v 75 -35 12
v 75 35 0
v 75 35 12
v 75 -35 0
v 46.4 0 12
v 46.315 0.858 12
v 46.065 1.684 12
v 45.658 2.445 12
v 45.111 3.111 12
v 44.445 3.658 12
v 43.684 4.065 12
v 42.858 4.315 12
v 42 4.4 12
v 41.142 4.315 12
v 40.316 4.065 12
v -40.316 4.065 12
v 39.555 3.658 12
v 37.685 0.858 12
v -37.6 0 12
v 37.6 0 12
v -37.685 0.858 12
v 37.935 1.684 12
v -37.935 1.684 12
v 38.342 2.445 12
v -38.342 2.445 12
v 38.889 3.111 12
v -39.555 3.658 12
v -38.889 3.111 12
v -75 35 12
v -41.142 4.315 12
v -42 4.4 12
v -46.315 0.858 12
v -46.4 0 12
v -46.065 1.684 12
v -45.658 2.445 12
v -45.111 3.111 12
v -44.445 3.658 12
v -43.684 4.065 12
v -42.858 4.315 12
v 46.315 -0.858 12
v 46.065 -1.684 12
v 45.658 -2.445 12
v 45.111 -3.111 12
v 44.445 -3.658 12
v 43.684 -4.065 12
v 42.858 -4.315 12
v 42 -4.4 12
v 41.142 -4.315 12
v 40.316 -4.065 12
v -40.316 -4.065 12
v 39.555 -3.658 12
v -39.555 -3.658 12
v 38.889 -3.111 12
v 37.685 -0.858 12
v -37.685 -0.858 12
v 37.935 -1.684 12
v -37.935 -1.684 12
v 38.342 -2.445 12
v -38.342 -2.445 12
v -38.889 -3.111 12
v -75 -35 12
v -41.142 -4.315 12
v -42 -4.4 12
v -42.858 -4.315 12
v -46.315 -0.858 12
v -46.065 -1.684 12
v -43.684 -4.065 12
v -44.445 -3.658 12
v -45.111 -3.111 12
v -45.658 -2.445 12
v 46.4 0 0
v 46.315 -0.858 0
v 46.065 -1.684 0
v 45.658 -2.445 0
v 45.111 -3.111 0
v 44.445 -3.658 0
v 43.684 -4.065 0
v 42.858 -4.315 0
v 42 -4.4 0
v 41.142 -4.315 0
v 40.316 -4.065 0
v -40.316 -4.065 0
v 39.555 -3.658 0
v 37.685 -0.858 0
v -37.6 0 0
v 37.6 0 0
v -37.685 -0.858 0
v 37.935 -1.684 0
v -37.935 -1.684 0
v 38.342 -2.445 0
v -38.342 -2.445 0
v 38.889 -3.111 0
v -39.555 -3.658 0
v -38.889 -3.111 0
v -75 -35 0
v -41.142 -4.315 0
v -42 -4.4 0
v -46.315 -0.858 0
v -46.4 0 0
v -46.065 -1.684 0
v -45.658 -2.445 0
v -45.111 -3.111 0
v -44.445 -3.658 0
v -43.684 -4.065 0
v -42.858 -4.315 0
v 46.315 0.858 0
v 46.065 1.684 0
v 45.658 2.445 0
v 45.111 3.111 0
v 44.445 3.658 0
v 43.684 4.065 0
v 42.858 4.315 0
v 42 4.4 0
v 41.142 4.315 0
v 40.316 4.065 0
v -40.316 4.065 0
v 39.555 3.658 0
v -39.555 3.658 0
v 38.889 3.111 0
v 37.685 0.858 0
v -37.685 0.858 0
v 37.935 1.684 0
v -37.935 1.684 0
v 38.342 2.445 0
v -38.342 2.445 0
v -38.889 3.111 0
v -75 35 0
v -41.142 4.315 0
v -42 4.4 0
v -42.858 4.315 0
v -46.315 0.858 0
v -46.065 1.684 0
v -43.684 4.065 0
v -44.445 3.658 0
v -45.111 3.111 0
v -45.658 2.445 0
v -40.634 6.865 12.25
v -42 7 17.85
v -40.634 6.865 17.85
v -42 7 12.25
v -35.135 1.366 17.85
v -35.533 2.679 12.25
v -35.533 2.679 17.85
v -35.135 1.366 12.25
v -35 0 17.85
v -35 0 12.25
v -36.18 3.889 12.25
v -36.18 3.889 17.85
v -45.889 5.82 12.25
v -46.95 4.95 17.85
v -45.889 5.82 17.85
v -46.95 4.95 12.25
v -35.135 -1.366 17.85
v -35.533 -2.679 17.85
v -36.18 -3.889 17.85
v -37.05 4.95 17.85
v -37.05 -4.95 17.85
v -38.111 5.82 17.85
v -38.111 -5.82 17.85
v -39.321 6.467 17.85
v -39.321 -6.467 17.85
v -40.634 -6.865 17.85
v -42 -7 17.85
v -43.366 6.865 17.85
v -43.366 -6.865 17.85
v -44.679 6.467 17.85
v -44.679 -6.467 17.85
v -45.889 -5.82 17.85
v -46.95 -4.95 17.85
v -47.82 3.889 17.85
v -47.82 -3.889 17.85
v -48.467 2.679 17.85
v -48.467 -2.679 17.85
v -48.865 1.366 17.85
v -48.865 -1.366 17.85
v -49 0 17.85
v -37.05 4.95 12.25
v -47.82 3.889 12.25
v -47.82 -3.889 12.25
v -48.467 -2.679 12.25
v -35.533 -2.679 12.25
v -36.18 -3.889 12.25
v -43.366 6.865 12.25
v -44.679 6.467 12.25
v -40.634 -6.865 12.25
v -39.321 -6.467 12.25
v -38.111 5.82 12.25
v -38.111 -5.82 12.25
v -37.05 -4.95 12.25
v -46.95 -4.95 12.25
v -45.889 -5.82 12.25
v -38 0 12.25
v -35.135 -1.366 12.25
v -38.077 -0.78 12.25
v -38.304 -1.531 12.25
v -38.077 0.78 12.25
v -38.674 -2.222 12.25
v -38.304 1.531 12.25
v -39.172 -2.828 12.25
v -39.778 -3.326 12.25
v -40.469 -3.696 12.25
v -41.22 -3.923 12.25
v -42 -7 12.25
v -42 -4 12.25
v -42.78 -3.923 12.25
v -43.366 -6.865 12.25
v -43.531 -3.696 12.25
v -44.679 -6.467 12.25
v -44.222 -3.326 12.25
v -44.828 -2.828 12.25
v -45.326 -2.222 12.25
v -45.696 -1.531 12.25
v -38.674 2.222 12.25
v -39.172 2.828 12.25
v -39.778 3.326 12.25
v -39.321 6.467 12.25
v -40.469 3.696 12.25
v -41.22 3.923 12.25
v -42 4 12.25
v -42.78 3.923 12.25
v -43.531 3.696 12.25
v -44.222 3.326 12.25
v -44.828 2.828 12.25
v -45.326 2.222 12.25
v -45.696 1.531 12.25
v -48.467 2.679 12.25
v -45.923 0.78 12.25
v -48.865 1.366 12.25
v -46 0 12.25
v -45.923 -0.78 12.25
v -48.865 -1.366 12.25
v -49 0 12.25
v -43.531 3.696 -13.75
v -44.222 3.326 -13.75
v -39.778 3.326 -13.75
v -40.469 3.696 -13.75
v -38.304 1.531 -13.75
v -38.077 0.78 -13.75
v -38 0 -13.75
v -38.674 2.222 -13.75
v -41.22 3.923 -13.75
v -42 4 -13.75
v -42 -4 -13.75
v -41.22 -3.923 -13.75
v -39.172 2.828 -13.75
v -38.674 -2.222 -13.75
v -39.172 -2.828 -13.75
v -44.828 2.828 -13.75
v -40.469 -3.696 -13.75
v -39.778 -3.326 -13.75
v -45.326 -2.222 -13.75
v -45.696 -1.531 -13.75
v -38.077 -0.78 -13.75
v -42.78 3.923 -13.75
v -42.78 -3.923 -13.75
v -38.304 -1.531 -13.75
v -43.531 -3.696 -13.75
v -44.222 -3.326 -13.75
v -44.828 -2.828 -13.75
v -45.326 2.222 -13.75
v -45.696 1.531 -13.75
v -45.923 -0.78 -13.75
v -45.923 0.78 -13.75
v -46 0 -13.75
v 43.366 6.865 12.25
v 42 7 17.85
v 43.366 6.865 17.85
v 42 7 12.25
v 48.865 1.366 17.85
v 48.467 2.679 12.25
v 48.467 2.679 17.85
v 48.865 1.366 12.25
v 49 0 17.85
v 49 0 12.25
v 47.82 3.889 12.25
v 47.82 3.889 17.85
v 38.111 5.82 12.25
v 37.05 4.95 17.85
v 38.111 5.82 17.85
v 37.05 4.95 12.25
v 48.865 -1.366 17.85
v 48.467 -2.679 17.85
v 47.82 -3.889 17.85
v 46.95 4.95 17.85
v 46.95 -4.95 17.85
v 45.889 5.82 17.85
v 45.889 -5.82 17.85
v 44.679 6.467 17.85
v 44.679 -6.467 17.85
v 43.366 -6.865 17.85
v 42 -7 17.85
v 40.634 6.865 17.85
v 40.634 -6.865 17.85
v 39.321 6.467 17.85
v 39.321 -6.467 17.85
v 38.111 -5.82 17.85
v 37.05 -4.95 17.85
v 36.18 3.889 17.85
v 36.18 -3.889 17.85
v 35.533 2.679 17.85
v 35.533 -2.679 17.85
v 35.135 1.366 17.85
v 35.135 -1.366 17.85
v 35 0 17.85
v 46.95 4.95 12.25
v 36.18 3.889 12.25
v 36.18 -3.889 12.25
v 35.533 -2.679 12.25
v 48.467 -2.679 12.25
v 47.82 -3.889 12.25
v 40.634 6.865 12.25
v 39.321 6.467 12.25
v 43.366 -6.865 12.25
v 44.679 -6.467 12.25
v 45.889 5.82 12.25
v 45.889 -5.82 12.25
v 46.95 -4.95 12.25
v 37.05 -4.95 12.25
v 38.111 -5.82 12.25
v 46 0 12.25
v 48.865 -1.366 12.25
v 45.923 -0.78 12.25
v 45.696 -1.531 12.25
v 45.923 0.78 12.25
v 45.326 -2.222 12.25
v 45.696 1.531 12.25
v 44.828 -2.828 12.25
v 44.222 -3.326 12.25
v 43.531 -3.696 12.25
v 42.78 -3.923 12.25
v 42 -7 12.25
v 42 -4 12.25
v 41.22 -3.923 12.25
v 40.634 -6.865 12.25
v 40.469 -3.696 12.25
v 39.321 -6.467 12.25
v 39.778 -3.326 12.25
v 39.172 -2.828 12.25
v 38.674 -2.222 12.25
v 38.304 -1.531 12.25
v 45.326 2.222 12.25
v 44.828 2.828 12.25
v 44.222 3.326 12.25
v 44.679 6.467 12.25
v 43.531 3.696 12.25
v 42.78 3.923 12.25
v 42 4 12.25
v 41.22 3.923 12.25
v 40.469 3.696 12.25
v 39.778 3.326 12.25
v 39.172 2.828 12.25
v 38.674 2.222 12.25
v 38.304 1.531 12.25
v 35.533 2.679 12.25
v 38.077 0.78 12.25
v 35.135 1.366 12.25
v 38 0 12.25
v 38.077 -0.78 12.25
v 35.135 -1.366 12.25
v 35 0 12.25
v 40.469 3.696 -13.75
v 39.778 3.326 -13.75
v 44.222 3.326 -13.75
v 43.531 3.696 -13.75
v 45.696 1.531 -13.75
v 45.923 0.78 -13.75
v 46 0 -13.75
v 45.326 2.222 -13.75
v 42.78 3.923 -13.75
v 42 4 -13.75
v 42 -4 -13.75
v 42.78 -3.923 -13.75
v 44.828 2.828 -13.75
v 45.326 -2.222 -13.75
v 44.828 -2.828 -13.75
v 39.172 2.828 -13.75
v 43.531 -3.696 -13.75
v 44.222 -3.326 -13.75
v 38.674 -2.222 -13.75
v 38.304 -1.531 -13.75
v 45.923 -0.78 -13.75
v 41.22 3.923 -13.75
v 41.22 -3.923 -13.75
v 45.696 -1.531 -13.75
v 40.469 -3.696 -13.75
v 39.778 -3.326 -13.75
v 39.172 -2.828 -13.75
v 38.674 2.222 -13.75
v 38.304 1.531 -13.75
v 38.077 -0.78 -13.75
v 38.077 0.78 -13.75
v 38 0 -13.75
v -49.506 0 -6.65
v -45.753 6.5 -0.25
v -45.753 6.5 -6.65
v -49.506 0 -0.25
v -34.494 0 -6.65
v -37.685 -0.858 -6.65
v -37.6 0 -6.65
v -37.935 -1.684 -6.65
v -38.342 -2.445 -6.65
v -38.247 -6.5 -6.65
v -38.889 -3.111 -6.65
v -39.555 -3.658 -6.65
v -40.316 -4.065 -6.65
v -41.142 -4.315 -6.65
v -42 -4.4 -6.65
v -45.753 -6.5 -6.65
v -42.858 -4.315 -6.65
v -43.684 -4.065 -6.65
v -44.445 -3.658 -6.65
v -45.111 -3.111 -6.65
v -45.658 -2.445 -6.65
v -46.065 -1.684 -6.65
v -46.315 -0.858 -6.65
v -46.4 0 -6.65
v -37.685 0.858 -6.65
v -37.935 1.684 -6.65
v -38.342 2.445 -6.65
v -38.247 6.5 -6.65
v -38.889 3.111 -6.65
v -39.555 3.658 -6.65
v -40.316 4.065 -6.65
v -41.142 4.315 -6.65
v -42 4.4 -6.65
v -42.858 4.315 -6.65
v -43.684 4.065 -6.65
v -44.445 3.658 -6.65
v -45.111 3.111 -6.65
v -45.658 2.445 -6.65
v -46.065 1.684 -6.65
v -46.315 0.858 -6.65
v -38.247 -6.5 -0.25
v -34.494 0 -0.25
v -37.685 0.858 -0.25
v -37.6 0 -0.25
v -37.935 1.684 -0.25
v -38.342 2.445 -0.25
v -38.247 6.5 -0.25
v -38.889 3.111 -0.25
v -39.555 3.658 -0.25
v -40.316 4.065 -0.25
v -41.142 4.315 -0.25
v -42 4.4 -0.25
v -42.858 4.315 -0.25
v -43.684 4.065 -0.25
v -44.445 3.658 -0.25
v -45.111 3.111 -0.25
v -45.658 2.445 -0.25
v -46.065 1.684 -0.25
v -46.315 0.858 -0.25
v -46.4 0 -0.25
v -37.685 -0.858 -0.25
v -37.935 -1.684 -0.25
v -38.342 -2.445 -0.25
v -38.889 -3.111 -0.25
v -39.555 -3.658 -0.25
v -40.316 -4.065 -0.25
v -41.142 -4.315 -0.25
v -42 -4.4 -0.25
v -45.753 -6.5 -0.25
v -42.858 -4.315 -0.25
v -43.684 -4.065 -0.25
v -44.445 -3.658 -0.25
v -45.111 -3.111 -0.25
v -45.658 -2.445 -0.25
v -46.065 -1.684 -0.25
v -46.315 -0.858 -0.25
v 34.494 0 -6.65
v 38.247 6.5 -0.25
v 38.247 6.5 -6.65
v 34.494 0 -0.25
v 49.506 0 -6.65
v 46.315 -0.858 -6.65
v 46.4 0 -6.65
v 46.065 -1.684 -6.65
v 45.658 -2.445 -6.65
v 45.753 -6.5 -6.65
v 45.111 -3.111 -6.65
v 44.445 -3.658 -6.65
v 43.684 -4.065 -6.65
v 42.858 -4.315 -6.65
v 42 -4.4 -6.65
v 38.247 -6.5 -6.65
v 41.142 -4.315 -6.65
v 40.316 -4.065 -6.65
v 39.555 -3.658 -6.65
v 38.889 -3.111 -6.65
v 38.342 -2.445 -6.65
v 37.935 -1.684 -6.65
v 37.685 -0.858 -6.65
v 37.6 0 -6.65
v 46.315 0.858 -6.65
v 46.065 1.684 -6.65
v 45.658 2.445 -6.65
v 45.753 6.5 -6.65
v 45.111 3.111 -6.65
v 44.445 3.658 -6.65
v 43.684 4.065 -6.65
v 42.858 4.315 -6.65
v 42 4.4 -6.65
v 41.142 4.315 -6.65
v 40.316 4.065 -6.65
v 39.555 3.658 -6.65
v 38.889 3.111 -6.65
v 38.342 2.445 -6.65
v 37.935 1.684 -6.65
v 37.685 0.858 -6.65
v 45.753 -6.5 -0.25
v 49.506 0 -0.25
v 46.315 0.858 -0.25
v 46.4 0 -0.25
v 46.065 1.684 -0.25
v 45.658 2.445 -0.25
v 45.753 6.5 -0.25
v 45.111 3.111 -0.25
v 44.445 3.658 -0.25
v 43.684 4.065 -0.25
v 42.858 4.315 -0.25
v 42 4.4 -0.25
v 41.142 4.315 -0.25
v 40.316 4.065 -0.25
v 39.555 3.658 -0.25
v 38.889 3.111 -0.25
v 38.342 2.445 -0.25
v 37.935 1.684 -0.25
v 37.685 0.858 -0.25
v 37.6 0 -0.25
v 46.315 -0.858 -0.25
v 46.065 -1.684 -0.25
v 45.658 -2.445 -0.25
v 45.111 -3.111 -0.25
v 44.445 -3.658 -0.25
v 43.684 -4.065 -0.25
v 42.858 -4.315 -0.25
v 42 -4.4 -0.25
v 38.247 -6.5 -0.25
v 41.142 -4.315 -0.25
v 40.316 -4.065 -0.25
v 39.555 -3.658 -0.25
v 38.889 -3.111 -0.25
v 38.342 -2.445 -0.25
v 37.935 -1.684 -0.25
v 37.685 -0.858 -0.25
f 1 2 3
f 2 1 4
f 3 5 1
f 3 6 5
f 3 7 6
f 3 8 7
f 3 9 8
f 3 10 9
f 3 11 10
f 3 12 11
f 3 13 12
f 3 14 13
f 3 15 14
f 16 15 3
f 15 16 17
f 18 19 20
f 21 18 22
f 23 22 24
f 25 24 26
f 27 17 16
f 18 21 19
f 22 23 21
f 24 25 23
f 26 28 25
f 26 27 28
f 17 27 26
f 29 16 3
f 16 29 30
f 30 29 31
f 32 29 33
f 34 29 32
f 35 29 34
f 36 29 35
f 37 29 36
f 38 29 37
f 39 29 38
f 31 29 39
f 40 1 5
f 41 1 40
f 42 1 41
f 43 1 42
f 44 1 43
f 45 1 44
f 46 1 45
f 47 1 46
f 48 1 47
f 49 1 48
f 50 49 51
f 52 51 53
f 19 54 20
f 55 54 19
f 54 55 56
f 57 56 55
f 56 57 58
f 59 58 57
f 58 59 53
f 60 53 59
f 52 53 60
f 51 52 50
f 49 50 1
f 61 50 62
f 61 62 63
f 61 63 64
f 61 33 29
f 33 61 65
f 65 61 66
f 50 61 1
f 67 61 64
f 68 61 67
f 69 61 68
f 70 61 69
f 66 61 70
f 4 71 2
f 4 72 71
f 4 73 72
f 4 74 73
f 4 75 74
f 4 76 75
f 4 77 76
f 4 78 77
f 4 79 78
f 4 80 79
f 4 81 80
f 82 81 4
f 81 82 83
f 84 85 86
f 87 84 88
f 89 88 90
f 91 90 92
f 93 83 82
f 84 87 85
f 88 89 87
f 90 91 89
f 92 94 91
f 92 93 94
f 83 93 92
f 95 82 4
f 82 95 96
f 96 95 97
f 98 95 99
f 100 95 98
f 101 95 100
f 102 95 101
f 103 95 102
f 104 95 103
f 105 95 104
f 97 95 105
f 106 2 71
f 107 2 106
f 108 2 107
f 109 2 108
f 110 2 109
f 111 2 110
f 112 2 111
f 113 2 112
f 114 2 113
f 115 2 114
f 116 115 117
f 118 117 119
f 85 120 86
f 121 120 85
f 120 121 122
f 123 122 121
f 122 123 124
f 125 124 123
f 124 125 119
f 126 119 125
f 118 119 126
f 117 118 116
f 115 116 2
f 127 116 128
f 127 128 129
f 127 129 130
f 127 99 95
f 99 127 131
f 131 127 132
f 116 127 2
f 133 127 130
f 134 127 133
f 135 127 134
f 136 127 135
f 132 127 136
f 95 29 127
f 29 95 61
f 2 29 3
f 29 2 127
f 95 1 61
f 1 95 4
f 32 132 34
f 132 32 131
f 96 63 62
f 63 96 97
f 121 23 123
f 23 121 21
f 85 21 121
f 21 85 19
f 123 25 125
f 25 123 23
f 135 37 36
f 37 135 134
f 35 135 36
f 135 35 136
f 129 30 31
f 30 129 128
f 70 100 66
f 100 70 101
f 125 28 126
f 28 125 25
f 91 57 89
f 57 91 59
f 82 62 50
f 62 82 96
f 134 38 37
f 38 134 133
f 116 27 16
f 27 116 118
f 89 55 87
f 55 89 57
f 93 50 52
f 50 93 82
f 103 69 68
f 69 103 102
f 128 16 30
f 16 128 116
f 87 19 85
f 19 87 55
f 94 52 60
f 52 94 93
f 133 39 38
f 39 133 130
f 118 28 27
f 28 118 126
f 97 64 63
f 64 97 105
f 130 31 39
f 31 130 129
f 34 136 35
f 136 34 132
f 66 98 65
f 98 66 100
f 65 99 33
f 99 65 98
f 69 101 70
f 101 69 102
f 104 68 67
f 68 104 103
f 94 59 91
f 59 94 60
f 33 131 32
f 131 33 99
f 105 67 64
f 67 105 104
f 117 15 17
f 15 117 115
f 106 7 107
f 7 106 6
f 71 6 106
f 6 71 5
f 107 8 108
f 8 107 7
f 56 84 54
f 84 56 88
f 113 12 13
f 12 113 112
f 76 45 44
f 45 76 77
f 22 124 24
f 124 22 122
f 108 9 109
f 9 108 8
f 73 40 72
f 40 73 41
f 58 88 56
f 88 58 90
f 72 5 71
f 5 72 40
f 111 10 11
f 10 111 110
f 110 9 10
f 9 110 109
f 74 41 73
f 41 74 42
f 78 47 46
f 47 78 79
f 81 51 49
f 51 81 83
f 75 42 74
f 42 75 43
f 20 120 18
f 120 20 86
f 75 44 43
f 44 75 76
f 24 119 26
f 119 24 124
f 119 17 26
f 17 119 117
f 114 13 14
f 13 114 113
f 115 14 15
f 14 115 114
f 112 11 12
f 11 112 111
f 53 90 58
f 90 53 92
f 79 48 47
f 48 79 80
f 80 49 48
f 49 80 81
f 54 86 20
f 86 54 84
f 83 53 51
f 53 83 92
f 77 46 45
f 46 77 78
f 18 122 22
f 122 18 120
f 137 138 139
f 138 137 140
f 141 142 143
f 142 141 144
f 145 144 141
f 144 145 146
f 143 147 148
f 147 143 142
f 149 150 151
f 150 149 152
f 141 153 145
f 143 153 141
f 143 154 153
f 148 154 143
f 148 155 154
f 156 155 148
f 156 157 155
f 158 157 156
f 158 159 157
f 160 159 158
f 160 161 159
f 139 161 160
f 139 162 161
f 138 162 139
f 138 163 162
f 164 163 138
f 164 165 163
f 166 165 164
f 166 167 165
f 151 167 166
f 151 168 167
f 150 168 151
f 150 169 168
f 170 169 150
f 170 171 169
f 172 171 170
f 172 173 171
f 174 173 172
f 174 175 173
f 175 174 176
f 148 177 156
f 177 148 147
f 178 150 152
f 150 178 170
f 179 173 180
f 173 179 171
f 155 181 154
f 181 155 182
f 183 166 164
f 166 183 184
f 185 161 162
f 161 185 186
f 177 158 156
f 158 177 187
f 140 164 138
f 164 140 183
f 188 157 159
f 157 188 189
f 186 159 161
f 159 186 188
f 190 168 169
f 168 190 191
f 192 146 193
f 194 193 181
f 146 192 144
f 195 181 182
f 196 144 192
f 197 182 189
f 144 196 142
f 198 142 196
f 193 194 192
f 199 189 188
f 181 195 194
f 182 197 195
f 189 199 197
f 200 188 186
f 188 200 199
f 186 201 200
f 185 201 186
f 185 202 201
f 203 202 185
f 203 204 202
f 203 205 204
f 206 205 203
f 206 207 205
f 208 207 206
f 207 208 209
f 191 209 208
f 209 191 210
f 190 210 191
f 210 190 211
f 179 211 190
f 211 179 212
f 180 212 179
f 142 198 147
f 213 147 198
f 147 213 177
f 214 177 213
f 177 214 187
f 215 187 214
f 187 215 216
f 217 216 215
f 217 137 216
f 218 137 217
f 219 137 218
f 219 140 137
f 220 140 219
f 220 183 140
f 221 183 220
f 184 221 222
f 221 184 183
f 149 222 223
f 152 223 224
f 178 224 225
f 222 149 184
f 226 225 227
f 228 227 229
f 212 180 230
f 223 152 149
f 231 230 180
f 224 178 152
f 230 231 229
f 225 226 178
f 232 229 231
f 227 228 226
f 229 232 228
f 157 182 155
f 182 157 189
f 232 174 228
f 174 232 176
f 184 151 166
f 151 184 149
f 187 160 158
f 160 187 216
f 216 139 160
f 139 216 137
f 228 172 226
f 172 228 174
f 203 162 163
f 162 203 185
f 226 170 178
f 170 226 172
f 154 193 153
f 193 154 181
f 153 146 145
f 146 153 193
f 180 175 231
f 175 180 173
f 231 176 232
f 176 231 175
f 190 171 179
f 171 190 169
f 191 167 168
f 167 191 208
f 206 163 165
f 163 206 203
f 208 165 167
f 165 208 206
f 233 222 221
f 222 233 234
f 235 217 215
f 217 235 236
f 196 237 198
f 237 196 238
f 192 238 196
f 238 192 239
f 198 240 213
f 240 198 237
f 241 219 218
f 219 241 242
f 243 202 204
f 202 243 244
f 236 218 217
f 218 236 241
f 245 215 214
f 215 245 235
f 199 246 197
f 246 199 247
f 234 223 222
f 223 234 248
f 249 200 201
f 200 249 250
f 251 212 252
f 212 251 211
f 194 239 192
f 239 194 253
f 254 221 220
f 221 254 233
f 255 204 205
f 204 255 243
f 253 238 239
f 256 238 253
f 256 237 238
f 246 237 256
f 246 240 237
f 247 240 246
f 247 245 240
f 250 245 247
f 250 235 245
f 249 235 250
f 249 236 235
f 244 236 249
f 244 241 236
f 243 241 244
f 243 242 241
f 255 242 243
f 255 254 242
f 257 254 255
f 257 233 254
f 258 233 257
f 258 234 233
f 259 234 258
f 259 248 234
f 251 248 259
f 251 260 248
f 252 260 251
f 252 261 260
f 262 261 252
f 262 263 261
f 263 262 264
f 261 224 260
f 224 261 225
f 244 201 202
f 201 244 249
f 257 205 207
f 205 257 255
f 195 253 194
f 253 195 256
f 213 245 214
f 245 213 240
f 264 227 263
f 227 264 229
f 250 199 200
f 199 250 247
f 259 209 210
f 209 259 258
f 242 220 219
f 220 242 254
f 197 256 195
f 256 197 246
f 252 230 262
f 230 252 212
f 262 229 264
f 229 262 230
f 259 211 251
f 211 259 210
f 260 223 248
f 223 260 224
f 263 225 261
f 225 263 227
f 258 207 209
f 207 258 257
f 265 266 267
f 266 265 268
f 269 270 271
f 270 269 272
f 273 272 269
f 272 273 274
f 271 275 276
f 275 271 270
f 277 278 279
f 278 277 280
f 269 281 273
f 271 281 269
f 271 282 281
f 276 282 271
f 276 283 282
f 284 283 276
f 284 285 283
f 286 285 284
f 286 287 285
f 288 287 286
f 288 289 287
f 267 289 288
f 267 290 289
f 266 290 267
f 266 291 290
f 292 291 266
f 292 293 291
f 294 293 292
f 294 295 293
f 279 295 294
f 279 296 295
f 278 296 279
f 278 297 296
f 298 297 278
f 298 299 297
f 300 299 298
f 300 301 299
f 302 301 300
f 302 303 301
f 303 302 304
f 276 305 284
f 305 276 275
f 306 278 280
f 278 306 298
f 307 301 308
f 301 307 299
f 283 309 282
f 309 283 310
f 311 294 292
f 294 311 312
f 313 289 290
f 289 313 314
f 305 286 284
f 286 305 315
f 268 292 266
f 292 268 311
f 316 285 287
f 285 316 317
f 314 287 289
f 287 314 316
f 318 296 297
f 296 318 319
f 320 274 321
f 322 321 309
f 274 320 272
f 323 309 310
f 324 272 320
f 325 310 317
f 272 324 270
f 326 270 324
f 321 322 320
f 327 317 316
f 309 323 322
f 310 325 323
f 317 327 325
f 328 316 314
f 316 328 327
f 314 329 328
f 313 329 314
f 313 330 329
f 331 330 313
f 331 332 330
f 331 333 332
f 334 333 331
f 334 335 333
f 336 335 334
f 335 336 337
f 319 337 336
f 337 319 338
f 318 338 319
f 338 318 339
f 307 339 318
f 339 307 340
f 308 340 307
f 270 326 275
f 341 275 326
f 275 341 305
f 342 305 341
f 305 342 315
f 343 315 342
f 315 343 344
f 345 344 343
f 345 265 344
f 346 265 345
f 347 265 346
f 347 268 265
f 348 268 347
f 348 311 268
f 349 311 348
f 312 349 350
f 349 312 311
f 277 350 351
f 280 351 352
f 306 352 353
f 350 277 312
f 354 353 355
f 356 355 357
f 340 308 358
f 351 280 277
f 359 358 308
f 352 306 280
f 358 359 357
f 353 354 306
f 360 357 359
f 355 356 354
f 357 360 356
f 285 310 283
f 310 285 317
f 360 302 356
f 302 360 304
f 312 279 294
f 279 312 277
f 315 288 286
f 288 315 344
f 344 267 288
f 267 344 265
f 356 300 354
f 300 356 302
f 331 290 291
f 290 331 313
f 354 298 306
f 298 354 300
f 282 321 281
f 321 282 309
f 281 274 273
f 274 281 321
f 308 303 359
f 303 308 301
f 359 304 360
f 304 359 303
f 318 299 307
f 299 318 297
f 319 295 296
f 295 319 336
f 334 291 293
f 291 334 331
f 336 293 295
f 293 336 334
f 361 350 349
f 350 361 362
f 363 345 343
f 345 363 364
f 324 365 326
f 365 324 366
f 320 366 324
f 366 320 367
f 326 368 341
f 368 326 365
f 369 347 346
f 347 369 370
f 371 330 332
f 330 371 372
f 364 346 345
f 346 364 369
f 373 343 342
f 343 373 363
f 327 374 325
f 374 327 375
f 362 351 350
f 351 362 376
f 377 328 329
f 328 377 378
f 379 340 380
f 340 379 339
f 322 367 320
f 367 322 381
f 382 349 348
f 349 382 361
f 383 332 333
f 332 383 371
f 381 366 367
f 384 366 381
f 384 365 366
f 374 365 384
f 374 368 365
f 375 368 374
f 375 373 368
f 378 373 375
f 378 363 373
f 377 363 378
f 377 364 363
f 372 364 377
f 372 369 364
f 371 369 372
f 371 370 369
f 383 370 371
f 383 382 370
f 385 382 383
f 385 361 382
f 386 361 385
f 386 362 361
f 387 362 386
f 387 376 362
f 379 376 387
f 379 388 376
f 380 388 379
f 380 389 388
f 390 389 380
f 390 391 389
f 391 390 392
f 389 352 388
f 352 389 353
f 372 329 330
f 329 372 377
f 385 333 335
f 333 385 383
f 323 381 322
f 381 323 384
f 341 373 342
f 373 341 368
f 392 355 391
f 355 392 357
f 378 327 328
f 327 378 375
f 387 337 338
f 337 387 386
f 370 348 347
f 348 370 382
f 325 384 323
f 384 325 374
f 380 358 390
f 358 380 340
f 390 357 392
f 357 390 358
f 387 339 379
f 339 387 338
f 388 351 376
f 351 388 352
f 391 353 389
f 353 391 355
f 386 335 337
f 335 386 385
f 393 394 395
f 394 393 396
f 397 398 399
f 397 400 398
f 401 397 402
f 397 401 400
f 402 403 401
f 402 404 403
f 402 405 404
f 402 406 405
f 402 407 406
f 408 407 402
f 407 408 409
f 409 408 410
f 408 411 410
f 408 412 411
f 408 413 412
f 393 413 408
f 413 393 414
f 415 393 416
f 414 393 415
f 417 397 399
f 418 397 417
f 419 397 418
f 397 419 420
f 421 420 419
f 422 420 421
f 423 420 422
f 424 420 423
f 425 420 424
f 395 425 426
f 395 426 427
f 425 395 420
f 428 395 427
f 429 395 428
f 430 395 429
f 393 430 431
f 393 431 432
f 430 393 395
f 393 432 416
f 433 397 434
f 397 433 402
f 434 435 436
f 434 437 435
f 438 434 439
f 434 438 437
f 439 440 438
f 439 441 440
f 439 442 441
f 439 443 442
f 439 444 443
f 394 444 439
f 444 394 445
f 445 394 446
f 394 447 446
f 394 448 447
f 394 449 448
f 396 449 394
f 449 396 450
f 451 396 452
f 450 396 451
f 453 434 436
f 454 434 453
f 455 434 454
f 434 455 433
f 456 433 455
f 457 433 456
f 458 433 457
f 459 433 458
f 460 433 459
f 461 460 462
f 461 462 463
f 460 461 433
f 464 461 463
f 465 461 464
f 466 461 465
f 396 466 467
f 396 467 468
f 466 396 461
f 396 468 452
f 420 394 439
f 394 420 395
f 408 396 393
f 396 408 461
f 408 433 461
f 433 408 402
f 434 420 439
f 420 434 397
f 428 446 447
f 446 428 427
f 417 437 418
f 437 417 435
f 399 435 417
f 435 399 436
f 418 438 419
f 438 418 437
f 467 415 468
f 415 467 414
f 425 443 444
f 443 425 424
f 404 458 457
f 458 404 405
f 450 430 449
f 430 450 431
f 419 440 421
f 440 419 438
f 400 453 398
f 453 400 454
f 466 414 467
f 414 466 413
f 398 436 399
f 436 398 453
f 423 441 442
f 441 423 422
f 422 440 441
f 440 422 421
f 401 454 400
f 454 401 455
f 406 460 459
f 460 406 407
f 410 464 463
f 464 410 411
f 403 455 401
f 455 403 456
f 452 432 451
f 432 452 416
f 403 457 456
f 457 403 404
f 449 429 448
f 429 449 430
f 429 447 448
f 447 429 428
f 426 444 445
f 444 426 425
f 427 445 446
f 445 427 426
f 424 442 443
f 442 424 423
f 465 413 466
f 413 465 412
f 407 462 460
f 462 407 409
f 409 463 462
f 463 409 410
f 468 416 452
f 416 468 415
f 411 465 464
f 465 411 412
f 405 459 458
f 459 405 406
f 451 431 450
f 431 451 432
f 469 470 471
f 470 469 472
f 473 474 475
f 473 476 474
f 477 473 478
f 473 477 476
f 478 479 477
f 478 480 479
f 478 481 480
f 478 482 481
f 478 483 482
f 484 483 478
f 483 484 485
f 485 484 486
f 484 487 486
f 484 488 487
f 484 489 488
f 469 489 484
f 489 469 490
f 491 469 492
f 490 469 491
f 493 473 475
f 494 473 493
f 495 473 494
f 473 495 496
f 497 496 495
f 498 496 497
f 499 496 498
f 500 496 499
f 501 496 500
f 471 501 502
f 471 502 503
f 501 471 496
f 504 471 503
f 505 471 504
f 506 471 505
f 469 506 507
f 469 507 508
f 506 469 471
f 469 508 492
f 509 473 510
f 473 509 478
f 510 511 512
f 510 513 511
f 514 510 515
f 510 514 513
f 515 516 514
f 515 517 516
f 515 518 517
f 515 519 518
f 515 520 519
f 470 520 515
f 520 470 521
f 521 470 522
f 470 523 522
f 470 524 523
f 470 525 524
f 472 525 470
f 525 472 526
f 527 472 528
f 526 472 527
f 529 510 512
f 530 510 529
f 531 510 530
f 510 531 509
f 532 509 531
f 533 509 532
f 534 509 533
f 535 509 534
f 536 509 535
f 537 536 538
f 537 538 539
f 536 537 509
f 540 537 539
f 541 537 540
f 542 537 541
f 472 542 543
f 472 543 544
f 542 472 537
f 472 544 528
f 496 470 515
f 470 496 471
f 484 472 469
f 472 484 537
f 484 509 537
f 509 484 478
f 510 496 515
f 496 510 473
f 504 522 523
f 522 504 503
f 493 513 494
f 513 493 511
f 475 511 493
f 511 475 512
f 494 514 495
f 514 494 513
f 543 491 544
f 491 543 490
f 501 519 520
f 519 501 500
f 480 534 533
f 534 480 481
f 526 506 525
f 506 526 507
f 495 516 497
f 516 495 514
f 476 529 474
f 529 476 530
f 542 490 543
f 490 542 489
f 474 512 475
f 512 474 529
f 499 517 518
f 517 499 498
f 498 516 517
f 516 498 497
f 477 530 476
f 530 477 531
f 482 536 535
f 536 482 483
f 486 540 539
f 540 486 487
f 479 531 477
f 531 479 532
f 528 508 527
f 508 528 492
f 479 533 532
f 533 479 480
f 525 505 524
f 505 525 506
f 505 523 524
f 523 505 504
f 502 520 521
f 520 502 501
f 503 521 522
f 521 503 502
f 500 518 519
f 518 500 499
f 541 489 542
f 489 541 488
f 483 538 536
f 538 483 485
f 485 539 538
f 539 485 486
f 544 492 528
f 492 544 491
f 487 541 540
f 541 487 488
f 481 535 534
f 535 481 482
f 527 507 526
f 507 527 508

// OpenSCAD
$fn = 32;

// ------------------------------------------------------------------------
// Bolted plate: 150 x 70 x 12 mm plate, 2 fasteners
// Every part is its own module, assembly() places them once.
// ------------------------------------------------------------------------

// --- part 1 ---
module plate() {
  difference() {
    translate([-75, -35, 0]) cube([150, 70, 12]);
    translate([-42, 0, -1]) cylinder(h = 14, d = 8.8);
    translate([42, 0, -1]) cylinder(h = 14, d = 8.8);
  }
}

// --- part 2 ---
module bolt1() {
  cylinder(h = 5.6, d = 14);
  translate([0, 0, -26]) cylinder(h = 26, d = 8);
}

// --- part 3 ---
module bolt2() {
  cylinder(h = 5.6, d = 14);
  translate([0, 0, -26]) cylinder(h = 26, d = 8);
}

// --- part 4 ---
module nut1() {
  difference() {
    linear_extrude(height = 6.4) polygon(points = [[7.506, 0], [3.753, 6.5], [-3.753, 6.5], [-7.506, 0], [-3.753, -6.5], [3.753, -6.5]]);
    translate([0, 0, -1]) cylinder(h = 8.4, d = 8.8);
  }
}

// --- part 5 ---
module nut2() {
  difference() {
    linear_extrude(height = 6.4) polygon(points = [[7.506, 0], [3.753, 6.5], [-3.753, 6.5], [-7.506, 0], [-3.753, -6.5], [3.753, -6.5]]);
    translate([0, 0, -1]) cylinder(h = 8.4, d = 8.8);
  }
}

// --- assembly ---
module assembly() {
  translate([0, 0, 0]) rotate([0, 0, 0]) plate();
  translate([-42, 0, 12.25]) rotate([0, 0, 0]) bolt1();
  translate([42, 0, 12.25]) rotate([0, 0, 0]) bolt2();
  translate([-42, 0, -6.65]) rotate([0, 0, 0]) nut1();
  translate([42, 0, -6.65]) rotate([0, 0, 0]) nut2();
}

assembly();
